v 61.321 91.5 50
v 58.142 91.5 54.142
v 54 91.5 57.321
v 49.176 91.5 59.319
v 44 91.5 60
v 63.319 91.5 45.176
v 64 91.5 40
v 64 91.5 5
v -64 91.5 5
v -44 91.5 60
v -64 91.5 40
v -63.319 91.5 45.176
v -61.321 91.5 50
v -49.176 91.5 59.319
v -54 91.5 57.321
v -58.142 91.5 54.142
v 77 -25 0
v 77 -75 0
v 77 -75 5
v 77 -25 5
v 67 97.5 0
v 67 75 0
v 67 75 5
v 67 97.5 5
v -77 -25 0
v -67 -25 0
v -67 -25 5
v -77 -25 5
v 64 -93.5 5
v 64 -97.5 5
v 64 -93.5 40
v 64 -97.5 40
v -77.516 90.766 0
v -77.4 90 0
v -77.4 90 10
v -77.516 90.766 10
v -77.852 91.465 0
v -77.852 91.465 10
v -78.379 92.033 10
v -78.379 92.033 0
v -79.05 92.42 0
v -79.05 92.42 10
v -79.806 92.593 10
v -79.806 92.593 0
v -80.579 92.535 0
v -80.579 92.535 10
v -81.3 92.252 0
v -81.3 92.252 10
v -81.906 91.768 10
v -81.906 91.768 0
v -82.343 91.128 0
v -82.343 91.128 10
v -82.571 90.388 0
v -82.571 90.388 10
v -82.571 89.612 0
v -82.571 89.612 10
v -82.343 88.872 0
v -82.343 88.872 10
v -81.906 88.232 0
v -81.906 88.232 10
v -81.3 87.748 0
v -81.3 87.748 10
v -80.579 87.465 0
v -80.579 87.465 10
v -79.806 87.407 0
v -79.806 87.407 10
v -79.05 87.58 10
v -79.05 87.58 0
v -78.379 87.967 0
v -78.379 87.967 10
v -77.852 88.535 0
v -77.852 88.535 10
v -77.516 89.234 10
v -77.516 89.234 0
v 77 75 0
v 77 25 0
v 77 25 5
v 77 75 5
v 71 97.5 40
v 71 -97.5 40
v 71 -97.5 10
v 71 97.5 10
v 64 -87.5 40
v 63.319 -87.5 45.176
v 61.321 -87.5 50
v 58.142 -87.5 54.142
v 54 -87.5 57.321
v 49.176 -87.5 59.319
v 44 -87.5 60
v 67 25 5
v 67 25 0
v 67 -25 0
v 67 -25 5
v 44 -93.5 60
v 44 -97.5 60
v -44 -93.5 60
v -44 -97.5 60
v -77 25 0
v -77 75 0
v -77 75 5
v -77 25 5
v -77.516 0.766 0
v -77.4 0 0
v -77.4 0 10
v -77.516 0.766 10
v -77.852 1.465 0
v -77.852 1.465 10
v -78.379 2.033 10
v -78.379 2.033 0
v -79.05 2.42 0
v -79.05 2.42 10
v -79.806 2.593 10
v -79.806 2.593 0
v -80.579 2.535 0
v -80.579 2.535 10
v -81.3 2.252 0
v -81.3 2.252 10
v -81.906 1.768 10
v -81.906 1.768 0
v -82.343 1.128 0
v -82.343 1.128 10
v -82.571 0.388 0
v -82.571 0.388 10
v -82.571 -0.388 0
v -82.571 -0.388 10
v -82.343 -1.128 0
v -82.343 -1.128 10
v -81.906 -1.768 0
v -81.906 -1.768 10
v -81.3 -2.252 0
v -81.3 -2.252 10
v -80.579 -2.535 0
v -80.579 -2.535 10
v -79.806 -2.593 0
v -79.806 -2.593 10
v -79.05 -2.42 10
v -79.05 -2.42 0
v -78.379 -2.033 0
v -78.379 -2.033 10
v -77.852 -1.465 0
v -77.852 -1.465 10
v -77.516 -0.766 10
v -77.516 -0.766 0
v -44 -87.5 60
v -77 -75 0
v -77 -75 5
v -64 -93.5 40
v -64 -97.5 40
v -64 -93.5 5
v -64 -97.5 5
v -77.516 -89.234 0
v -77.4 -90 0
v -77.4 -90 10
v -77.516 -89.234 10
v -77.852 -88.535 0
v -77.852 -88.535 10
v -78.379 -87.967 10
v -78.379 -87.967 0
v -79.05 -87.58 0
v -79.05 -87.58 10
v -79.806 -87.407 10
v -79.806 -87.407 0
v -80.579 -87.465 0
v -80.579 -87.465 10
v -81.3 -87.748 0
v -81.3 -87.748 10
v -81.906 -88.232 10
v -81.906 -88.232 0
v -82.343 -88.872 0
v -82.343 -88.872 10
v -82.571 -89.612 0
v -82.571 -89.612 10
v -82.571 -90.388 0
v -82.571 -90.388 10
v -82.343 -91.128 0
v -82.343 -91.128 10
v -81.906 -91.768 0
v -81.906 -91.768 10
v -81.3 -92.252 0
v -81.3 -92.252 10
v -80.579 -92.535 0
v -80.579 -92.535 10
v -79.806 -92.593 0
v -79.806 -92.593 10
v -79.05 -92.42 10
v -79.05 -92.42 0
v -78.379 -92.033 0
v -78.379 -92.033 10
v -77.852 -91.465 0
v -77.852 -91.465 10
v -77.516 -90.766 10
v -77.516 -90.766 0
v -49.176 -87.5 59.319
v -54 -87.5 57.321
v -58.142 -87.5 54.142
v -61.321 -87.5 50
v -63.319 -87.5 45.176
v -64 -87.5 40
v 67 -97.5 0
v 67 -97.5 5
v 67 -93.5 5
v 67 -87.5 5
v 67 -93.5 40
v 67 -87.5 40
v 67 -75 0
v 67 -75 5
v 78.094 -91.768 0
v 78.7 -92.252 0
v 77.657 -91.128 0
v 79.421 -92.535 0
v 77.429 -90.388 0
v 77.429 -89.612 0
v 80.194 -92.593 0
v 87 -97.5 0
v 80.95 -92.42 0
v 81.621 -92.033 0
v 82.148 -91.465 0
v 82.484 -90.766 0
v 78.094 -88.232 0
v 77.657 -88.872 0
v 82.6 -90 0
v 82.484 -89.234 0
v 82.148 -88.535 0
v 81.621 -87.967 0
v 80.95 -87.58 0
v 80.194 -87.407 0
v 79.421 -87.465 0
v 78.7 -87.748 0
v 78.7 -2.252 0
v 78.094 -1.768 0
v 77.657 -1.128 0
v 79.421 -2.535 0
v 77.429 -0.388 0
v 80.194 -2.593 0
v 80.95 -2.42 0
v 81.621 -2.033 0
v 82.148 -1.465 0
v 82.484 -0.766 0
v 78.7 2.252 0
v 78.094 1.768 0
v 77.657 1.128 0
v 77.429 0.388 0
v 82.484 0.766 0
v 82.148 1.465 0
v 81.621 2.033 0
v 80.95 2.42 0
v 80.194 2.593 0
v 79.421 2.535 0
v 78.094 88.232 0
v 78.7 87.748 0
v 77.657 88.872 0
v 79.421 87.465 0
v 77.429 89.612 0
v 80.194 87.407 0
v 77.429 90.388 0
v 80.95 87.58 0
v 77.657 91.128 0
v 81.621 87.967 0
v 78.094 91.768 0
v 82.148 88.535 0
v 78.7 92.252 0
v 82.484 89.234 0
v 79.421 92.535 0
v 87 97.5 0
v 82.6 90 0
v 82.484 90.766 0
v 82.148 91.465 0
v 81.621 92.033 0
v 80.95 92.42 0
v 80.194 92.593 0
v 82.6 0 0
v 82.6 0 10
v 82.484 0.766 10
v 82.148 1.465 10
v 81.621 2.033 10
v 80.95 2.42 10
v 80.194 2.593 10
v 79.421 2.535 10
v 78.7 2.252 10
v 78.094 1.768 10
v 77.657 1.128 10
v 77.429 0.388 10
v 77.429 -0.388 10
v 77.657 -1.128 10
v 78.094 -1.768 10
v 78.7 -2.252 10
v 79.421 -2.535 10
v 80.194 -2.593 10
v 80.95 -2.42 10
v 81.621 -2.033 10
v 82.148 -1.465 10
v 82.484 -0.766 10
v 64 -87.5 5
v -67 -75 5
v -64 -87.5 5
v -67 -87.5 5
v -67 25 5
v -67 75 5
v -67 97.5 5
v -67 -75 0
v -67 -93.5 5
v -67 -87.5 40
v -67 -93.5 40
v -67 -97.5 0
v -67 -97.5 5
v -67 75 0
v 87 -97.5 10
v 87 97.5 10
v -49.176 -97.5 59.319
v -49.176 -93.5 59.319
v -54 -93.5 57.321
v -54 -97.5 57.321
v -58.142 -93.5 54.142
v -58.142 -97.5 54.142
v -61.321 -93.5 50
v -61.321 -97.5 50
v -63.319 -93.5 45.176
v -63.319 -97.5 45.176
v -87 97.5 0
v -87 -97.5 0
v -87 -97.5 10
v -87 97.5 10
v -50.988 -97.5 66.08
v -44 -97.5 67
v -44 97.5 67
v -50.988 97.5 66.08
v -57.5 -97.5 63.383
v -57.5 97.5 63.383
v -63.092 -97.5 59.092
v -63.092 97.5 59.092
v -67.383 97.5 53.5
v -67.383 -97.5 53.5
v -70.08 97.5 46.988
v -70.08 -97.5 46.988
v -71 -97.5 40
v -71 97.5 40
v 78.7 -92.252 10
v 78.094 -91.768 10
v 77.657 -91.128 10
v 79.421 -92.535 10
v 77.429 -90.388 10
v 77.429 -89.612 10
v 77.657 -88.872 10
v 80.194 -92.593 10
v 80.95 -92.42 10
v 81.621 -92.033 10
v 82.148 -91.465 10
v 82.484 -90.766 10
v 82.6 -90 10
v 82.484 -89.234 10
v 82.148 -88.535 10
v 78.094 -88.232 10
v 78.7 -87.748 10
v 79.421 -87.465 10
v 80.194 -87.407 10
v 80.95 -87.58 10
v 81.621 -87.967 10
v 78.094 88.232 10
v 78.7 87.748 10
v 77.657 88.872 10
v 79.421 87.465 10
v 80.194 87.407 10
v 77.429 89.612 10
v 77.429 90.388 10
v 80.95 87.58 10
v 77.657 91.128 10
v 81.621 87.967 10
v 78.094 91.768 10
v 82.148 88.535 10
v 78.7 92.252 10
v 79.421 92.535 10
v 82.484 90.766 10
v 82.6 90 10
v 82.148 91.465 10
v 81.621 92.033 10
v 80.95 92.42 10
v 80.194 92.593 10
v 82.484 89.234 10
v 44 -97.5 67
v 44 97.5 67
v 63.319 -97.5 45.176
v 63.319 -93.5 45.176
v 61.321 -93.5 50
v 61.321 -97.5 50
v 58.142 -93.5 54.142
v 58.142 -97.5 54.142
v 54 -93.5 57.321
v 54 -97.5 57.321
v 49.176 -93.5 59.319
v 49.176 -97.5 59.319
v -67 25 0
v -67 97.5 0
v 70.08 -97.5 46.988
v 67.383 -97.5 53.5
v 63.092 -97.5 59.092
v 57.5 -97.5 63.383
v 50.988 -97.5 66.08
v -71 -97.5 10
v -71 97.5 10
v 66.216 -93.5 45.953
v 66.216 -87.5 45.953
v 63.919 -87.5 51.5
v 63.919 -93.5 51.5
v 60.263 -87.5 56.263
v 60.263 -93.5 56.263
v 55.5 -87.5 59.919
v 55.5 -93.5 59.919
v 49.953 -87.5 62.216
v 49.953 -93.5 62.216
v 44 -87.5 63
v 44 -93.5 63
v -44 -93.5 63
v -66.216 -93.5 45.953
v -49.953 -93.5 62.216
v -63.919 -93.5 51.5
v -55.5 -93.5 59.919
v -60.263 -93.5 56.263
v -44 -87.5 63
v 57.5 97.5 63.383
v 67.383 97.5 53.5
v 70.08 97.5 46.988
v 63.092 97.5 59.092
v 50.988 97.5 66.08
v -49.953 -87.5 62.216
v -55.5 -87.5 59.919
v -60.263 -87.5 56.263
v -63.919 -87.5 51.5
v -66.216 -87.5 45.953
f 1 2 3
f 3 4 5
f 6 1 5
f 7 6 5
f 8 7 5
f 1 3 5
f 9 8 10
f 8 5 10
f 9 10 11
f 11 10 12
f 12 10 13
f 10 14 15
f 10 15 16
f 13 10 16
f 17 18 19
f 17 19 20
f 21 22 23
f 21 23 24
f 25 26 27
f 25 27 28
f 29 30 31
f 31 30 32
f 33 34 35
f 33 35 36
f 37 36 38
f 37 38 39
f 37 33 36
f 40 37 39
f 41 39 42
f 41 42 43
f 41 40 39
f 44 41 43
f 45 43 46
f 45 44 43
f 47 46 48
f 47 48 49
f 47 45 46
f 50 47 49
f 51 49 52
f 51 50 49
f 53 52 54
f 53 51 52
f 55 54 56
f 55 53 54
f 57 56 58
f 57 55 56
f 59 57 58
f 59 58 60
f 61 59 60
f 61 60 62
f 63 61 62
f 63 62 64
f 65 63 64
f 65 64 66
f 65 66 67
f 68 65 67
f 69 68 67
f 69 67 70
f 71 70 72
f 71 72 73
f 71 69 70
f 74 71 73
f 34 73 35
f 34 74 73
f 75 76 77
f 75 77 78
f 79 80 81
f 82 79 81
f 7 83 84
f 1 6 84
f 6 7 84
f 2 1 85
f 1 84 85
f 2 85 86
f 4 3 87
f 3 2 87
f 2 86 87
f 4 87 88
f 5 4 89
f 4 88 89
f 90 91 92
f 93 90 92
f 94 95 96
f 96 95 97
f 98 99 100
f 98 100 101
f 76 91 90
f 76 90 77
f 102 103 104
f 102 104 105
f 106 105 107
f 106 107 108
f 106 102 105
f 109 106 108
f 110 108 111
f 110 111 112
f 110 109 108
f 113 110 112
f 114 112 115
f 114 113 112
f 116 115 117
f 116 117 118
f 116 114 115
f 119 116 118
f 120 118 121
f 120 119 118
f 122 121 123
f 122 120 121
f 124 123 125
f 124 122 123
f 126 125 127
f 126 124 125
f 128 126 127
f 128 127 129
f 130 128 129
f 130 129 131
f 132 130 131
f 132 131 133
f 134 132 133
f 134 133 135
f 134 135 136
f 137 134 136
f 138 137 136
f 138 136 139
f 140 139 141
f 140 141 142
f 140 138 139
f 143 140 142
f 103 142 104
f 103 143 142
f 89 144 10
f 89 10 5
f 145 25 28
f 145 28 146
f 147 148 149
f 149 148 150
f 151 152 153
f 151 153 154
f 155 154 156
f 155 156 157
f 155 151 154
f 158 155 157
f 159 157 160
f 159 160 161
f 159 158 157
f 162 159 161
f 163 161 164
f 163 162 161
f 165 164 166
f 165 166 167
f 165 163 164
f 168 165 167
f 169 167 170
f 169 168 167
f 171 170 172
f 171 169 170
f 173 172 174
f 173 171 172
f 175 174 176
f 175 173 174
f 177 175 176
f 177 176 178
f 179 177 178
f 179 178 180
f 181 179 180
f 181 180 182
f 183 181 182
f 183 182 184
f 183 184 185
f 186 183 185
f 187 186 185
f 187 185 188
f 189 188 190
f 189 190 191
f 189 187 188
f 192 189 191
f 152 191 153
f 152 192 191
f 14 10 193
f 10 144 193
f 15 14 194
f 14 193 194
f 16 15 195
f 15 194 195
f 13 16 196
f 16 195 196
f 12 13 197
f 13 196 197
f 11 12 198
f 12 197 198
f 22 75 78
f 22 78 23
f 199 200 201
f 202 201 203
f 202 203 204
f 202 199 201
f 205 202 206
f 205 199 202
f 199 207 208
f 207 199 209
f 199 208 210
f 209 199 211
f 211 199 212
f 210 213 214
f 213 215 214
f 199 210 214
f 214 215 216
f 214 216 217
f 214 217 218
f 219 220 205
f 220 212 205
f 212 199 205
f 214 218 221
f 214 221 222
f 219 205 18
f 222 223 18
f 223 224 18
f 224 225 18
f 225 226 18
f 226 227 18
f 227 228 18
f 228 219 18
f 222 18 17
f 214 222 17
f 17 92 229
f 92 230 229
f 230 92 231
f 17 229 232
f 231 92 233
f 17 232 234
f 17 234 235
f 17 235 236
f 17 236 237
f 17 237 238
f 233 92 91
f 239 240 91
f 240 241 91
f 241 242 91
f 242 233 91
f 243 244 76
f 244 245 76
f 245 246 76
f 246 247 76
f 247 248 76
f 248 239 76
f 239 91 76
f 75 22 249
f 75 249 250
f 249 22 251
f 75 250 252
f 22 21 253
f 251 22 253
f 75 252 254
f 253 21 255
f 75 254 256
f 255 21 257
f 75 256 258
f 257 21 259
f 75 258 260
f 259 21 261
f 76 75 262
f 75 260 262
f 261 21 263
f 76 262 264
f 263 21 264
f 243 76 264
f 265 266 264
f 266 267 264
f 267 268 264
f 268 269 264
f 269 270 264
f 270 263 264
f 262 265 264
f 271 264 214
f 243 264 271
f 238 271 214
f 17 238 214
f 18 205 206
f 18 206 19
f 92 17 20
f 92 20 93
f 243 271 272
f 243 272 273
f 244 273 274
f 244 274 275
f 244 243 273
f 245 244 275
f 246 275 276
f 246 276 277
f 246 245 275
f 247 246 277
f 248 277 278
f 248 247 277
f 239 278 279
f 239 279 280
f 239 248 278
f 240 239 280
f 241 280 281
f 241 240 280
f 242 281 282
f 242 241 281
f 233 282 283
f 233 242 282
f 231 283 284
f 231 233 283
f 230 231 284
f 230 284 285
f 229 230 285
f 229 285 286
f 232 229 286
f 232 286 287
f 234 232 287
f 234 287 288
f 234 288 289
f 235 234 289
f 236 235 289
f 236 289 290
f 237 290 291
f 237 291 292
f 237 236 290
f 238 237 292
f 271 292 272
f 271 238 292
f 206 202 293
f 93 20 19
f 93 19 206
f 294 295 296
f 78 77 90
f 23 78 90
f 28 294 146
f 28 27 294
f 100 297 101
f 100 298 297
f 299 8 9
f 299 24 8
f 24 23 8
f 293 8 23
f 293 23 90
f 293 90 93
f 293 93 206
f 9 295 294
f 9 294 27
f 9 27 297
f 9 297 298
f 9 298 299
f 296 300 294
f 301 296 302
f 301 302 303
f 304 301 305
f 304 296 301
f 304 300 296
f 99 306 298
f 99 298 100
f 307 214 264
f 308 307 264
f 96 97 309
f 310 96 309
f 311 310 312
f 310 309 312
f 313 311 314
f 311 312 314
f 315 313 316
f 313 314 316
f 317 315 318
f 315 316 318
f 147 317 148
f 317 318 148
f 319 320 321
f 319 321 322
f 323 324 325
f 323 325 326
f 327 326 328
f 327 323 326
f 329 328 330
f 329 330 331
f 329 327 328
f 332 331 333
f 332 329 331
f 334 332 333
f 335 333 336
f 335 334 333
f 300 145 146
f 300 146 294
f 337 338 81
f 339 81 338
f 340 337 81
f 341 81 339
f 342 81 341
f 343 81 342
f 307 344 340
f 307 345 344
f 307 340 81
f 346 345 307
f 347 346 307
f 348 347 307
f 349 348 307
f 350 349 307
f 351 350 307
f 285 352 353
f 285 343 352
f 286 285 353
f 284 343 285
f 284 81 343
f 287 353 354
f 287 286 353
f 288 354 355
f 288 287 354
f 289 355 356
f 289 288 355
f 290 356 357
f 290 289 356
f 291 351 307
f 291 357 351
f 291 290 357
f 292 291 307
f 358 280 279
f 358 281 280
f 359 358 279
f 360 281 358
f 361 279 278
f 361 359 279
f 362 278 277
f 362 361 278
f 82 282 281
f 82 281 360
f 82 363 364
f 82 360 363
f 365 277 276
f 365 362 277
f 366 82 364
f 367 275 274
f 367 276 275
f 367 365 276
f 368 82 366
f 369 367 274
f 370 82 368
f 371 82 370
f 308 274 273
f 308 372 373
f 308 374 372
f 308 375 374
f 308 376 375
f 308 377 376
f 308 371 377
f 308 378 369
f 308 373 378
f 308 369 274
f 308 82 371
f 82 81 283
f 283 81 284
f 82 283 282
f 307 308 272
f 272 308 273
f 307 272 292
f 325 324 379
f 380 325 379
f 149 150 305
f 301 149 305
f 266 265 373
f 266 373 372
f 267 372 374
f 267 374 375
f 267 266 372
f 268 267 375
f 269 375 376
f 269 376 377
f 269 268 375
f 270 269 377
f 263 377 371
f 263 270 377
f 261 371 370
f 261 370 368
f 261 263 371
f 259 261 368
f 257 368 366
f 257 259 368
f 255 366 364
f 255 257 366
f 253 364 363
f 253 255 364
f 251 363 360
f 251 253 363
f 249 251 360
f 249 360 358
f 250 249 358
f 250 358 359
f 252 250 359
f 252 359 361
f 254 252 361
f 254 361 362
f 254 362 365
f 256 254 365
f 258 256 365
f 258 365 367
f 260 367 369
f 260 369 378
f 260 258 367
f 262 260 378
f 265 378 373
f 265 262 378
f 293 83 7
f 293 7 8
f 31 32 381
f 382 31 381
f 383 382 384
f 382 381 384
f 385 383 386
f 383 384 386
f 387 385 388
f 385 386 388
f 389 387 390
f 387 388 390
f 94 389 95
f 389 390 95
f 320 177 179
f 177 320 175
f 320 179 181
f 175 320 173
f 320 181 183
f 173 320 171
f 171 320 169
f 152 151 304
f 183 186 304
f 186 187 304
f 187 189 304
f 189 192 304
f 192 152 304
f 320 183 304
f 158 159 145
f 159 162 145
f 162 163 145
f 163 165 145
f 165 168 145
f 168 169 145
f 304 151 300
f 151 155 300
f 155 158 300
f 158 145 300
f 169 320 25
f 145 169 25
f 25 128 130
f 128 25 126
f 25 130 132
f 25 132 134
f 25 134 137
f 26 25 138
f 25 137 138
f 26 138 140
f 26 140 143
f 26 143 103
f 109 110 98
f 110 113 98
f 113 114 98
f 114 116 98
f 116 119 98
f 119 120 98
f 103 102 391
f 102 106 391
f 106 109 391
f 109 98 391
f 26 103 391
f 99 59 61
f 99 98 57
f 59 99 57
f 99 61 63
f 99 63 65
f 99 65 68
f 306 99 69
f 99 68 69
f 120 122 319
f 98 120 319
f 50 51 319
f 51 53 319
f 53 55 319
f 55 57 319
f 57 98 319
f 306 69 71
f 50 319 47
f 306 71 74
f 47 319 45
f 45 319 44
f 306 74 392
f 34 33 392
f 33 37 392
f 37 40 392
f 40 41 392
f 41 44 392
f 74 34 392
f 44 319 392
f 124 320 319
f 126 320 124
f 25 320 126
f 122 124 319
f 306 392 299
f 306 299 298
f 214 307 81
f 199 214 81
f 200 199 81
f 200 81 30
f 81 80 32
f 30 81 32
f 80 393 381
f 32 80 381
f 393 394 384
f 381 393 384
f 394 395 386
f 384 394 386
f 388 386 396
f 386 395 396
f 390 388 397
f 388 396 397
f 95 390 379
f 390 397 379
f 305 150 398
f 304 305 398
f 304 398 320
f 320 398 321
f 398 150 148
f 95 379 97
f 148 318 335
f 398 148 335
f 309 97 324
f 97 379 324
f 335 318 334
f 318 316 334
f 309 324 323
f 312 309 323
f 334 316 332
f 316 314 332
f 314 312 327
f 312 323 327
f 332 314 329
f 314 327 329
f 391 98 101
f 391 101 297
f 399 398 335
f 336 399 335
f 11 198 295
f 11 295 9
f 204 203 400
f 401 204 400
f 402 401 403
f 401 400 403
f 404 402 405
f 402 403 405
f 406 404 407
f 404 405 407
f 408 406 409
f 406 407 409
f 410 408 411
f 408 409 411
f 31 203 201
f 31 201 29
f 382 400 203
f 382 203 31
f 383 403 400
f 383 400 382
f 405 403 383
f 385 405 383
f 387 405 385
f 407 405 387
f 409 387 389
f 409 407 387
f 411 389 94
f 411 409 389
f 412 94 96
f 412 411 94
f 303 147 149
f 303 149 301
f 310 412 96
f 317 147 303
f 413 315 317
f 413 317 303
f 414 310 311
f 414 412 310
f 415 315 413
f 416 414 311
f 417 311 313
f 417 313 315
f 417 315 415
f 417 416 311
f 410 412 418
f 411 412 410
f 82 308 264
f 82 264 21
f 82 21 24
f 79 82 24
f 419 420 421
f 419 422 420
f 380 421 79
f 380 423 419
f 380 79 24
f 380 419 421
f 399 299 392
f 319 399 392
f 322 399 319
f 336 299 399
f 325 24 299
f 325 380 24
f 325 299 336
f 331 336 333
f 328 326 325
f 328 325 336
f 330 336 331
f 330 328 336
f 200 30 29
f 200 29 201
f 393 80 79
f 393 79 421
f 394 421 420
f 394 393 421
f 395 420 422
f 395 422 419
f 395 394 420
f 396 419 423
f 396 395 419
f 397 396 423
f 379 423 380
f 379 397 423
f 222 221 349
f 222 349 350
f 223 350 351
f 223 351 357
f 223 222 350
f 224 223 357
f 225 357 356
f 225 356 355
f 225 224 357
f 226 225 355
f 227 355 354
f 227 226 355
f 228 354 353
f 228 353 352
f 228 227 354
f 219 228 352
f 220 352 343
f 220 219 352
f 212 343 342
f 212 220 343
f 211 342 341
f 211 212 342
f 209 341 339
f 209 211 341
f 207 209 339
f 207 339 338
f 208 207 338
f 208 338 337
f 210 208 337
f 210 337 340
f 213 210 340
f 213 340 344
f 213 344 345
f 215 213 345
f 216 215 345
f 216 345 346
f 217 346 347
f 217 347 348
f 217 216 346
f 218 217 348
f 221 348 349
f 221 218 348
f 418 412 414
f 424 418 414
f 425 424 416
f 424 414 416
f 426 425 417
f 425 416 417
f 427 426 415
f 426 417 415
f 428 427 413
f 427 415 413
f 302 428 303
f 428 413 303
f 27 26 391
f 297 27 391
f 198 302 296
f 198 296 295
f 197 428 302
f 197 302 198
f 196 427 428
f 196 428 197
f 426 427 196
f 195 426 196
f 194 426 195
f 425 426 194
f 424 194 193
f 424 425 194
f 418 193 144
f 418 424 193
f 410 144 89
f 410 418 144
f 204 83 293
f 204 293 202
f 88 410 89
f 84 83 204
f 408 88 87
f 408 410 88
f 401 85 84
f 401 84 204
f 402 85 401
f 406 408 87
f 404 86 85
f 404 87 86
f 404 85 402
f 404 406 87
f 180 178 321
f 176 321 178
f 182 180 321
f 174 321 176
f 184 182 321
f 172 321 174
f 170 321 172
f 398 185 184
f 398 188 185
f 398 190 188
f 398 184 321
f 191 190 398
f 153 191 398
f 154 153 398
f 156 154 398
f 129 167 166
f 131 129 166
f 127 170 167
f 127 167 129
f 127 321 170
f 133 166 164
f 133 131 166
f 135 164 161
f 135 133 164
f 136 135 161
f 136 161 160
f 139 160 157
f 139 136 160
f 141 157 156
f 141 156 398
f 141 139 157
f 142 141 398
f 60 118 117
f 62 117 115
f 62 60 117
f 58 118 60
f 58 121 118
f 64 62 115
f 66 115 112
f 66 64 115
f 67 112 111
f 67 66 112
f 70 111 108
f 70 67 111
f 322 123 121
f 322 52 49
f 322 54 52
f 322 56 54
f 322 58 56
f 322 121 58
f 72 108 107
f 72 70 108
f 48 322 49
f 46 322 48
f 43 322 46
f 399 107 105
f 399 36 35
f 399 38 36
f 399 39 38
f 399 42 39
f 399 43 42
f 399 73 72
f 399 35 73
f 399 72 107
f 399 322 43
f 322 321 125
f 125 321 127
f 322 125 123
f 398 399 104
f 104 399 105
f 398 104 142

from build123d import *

# Parameters (mm, degrees)
SKETCH_W        = 174
SKETCH_H        = 195
SKETCH_R        = 2.6
PAD_DEPTH       = 10
PAD001_DEPTH    = 195
POCKET_DEPTH    = 5
POCKET_FACE10_W = 195
POCKET_FACE10_H = 128
POCKET001_DEPTH = 5
PAD003_DEPTH    = 6
POCKET003_DEPTH = 10
PAD006_DEPTH    = 4


with BuildPart() as part:
    # Sketch → Pad (new body)
    with BuildSketch(Plane.XY):
        Rectangle(SKETCH_W, SKETCH_H)
        with Locations((80, 90)):
            Circle(SKETCH_R, mode=Mode.SUBTRACT)
        with Locations((-80, 90)):
            Circle(SKETCH_R, mode=Mode.SUBTRACT)
        with Locations((-80, -90)):
            Circle(SKETCH_R, mode=Mode.SUBTRACT)
        with Locations((80, -90)):
            Circle(SKETCH_R, mode=Mode.SUBTRACT)
        with Locations((-80, 0)):
            Circle(SKETCH_R, mode=Mode.SUBTRACT)
        with Locations((80, 0)):
            Circle(SKETCH_R, mode=Mode.SUBTRACT)
    extrude(amount=PAD_DEPTH)

    # Sketch001 (on Face3 of Pad) → Pad001 (join)
    with BuildSketch(Plane.XZ.offset(97.5)):
        with BuildLine():
            Line((-64, 10), (-64, 40))
            ThreePointArc((-44, 60), (-58.142136, 54.142136), (-64, 40))
            Line((-44, 60), (44, 60))
            ThreePointArc((64, 40), (58.142136, 54.142136), (44, 60))
            Line((64, 40), (64, 10))
            Line((64, 10), (71, 10))
            Line((71, 40), (71, 10))
            ThreePointArc((71, 40), (63.091883, 59.091883), (44, 67))
            Line((-44, 67), (44, 67))
            ThreePointArc((-44, 67), (-63.091883, 59.091883), (-71, 40))
            Line((-71, 10), (-71, 40))
            Line((-64, 10), (-71, 10))
        make_face()
    extrude(amount=-PAD001_DEPTH)

    # Sketch003 (on Face4 of Pad001) → Pocket (cut)
    with BuildSketch(Plane(origin=(0, 0, 0), x_dir=(1, 0, 0), z_dir=(0, 0, -1))):
        Polygon((-67, 97.5), (67, 97.5), (67, 75), (77, 75), (77, 25), (67, 25), (67, 0), (67, -25), (77, -25), (77, -75), (67, -75), (67, -97.5), (-67, -97.5), (-67, -75), (-77, -75), (-77, -25), (-67, -25), (-67, 0), (-67, 25), (-77, 25), (-77, 75), (-67, 75), align=None)
    extrude(amount=-POCKET_DEPTH, mode=Mode.SUBTRACT)

    # Pocket Face10 → Pocket001 (cut)
    with BuildSketch(Plane(origin=(0, 0, 10), x_dir=(0, 1, 0), z_dir=(0, 0, 1))):
        Rectangle(POCKET_FACE10_W, POCKET_FACE10_H)
    extrude(amount=-POCKET001_DEPTH, mode=Mode.SUBTRACT)

    # Sketch005 (on Face6 of Pocket001) → Pad003 (join)
    with BuildSketch(Plane(origin=(0, 97.5, 0), x_dir=(-1, 0, 0), z_dir=(0, 1, 0))):
        with BuildLine():
            Line((-64, 5), (64, 5))
            Line((64, 40), (64, 5))
            ThreePointArc((64, 40), (58.142143, 54.142129), (44.00002, 60))
            Line((-44, 60), (44.00002, 60))
            ThreePointArc((-44, 60), (-58.142136, 54.142136), (-64, 40))
            Line((-64, 40), (-64, 5))
        make_face()
    extrude(amount=-PAD003_DEPTH)

    # Sketch006 (on Face30 of Pad003) → Pocket003 (cut)
    with BuildSketch(Plane.XZ.offset(97.5)):
        with BuildLine():
            ThreePointArc((-44, 63), (-60.263456, 56.263456), (-67, 40))
            Line((-67, 40), (-67, 0))
            Line((-67, 0), (67, 0))
            Line((67, 0), (67, 40))
            ThreePointArc((67, 40), (60.263456, 56.263456), (44, 63))
            Line((-44, 63), (44, 63))
        make_face()
    extrude(amount=-POCKET003_DEPTH, mode=Mode.SUBTRACT)

    # Sketch008 (on Face33 of Pocket003) → Pad006 (join)
    with BuildSketch(Plane.XZ.offset(97.5)):
        with BuildLine():
            Line((-44, 63), (44, 63))
            ThreePointArc((67, 40), (60.263456, 56.263456), (44, 63))
            Line((67, 5), (67, 40))
            Line((64, 5), (67, 5))
            Line((64, 5), (64, 40))
            ThreePointArc((64, 40), (58.142136, 54.142136), (44, 60))
            Line((44, 60), (-44, 60))
            ThreePointArc((-44, 60), (-58.142136, 54.142136), (-64, 40))
            Line((-64, 40), (-64, 5))
            Line((-64, 5), (-67, 5))
            Line((-67, 40), (-67, 5))
            ThreePointArc((-44, 63), (-60.263456, 56.263456), (-67, 40))
        make_face()
    extrude(amount=-PAD006_DEPTH)


solid = part.part
